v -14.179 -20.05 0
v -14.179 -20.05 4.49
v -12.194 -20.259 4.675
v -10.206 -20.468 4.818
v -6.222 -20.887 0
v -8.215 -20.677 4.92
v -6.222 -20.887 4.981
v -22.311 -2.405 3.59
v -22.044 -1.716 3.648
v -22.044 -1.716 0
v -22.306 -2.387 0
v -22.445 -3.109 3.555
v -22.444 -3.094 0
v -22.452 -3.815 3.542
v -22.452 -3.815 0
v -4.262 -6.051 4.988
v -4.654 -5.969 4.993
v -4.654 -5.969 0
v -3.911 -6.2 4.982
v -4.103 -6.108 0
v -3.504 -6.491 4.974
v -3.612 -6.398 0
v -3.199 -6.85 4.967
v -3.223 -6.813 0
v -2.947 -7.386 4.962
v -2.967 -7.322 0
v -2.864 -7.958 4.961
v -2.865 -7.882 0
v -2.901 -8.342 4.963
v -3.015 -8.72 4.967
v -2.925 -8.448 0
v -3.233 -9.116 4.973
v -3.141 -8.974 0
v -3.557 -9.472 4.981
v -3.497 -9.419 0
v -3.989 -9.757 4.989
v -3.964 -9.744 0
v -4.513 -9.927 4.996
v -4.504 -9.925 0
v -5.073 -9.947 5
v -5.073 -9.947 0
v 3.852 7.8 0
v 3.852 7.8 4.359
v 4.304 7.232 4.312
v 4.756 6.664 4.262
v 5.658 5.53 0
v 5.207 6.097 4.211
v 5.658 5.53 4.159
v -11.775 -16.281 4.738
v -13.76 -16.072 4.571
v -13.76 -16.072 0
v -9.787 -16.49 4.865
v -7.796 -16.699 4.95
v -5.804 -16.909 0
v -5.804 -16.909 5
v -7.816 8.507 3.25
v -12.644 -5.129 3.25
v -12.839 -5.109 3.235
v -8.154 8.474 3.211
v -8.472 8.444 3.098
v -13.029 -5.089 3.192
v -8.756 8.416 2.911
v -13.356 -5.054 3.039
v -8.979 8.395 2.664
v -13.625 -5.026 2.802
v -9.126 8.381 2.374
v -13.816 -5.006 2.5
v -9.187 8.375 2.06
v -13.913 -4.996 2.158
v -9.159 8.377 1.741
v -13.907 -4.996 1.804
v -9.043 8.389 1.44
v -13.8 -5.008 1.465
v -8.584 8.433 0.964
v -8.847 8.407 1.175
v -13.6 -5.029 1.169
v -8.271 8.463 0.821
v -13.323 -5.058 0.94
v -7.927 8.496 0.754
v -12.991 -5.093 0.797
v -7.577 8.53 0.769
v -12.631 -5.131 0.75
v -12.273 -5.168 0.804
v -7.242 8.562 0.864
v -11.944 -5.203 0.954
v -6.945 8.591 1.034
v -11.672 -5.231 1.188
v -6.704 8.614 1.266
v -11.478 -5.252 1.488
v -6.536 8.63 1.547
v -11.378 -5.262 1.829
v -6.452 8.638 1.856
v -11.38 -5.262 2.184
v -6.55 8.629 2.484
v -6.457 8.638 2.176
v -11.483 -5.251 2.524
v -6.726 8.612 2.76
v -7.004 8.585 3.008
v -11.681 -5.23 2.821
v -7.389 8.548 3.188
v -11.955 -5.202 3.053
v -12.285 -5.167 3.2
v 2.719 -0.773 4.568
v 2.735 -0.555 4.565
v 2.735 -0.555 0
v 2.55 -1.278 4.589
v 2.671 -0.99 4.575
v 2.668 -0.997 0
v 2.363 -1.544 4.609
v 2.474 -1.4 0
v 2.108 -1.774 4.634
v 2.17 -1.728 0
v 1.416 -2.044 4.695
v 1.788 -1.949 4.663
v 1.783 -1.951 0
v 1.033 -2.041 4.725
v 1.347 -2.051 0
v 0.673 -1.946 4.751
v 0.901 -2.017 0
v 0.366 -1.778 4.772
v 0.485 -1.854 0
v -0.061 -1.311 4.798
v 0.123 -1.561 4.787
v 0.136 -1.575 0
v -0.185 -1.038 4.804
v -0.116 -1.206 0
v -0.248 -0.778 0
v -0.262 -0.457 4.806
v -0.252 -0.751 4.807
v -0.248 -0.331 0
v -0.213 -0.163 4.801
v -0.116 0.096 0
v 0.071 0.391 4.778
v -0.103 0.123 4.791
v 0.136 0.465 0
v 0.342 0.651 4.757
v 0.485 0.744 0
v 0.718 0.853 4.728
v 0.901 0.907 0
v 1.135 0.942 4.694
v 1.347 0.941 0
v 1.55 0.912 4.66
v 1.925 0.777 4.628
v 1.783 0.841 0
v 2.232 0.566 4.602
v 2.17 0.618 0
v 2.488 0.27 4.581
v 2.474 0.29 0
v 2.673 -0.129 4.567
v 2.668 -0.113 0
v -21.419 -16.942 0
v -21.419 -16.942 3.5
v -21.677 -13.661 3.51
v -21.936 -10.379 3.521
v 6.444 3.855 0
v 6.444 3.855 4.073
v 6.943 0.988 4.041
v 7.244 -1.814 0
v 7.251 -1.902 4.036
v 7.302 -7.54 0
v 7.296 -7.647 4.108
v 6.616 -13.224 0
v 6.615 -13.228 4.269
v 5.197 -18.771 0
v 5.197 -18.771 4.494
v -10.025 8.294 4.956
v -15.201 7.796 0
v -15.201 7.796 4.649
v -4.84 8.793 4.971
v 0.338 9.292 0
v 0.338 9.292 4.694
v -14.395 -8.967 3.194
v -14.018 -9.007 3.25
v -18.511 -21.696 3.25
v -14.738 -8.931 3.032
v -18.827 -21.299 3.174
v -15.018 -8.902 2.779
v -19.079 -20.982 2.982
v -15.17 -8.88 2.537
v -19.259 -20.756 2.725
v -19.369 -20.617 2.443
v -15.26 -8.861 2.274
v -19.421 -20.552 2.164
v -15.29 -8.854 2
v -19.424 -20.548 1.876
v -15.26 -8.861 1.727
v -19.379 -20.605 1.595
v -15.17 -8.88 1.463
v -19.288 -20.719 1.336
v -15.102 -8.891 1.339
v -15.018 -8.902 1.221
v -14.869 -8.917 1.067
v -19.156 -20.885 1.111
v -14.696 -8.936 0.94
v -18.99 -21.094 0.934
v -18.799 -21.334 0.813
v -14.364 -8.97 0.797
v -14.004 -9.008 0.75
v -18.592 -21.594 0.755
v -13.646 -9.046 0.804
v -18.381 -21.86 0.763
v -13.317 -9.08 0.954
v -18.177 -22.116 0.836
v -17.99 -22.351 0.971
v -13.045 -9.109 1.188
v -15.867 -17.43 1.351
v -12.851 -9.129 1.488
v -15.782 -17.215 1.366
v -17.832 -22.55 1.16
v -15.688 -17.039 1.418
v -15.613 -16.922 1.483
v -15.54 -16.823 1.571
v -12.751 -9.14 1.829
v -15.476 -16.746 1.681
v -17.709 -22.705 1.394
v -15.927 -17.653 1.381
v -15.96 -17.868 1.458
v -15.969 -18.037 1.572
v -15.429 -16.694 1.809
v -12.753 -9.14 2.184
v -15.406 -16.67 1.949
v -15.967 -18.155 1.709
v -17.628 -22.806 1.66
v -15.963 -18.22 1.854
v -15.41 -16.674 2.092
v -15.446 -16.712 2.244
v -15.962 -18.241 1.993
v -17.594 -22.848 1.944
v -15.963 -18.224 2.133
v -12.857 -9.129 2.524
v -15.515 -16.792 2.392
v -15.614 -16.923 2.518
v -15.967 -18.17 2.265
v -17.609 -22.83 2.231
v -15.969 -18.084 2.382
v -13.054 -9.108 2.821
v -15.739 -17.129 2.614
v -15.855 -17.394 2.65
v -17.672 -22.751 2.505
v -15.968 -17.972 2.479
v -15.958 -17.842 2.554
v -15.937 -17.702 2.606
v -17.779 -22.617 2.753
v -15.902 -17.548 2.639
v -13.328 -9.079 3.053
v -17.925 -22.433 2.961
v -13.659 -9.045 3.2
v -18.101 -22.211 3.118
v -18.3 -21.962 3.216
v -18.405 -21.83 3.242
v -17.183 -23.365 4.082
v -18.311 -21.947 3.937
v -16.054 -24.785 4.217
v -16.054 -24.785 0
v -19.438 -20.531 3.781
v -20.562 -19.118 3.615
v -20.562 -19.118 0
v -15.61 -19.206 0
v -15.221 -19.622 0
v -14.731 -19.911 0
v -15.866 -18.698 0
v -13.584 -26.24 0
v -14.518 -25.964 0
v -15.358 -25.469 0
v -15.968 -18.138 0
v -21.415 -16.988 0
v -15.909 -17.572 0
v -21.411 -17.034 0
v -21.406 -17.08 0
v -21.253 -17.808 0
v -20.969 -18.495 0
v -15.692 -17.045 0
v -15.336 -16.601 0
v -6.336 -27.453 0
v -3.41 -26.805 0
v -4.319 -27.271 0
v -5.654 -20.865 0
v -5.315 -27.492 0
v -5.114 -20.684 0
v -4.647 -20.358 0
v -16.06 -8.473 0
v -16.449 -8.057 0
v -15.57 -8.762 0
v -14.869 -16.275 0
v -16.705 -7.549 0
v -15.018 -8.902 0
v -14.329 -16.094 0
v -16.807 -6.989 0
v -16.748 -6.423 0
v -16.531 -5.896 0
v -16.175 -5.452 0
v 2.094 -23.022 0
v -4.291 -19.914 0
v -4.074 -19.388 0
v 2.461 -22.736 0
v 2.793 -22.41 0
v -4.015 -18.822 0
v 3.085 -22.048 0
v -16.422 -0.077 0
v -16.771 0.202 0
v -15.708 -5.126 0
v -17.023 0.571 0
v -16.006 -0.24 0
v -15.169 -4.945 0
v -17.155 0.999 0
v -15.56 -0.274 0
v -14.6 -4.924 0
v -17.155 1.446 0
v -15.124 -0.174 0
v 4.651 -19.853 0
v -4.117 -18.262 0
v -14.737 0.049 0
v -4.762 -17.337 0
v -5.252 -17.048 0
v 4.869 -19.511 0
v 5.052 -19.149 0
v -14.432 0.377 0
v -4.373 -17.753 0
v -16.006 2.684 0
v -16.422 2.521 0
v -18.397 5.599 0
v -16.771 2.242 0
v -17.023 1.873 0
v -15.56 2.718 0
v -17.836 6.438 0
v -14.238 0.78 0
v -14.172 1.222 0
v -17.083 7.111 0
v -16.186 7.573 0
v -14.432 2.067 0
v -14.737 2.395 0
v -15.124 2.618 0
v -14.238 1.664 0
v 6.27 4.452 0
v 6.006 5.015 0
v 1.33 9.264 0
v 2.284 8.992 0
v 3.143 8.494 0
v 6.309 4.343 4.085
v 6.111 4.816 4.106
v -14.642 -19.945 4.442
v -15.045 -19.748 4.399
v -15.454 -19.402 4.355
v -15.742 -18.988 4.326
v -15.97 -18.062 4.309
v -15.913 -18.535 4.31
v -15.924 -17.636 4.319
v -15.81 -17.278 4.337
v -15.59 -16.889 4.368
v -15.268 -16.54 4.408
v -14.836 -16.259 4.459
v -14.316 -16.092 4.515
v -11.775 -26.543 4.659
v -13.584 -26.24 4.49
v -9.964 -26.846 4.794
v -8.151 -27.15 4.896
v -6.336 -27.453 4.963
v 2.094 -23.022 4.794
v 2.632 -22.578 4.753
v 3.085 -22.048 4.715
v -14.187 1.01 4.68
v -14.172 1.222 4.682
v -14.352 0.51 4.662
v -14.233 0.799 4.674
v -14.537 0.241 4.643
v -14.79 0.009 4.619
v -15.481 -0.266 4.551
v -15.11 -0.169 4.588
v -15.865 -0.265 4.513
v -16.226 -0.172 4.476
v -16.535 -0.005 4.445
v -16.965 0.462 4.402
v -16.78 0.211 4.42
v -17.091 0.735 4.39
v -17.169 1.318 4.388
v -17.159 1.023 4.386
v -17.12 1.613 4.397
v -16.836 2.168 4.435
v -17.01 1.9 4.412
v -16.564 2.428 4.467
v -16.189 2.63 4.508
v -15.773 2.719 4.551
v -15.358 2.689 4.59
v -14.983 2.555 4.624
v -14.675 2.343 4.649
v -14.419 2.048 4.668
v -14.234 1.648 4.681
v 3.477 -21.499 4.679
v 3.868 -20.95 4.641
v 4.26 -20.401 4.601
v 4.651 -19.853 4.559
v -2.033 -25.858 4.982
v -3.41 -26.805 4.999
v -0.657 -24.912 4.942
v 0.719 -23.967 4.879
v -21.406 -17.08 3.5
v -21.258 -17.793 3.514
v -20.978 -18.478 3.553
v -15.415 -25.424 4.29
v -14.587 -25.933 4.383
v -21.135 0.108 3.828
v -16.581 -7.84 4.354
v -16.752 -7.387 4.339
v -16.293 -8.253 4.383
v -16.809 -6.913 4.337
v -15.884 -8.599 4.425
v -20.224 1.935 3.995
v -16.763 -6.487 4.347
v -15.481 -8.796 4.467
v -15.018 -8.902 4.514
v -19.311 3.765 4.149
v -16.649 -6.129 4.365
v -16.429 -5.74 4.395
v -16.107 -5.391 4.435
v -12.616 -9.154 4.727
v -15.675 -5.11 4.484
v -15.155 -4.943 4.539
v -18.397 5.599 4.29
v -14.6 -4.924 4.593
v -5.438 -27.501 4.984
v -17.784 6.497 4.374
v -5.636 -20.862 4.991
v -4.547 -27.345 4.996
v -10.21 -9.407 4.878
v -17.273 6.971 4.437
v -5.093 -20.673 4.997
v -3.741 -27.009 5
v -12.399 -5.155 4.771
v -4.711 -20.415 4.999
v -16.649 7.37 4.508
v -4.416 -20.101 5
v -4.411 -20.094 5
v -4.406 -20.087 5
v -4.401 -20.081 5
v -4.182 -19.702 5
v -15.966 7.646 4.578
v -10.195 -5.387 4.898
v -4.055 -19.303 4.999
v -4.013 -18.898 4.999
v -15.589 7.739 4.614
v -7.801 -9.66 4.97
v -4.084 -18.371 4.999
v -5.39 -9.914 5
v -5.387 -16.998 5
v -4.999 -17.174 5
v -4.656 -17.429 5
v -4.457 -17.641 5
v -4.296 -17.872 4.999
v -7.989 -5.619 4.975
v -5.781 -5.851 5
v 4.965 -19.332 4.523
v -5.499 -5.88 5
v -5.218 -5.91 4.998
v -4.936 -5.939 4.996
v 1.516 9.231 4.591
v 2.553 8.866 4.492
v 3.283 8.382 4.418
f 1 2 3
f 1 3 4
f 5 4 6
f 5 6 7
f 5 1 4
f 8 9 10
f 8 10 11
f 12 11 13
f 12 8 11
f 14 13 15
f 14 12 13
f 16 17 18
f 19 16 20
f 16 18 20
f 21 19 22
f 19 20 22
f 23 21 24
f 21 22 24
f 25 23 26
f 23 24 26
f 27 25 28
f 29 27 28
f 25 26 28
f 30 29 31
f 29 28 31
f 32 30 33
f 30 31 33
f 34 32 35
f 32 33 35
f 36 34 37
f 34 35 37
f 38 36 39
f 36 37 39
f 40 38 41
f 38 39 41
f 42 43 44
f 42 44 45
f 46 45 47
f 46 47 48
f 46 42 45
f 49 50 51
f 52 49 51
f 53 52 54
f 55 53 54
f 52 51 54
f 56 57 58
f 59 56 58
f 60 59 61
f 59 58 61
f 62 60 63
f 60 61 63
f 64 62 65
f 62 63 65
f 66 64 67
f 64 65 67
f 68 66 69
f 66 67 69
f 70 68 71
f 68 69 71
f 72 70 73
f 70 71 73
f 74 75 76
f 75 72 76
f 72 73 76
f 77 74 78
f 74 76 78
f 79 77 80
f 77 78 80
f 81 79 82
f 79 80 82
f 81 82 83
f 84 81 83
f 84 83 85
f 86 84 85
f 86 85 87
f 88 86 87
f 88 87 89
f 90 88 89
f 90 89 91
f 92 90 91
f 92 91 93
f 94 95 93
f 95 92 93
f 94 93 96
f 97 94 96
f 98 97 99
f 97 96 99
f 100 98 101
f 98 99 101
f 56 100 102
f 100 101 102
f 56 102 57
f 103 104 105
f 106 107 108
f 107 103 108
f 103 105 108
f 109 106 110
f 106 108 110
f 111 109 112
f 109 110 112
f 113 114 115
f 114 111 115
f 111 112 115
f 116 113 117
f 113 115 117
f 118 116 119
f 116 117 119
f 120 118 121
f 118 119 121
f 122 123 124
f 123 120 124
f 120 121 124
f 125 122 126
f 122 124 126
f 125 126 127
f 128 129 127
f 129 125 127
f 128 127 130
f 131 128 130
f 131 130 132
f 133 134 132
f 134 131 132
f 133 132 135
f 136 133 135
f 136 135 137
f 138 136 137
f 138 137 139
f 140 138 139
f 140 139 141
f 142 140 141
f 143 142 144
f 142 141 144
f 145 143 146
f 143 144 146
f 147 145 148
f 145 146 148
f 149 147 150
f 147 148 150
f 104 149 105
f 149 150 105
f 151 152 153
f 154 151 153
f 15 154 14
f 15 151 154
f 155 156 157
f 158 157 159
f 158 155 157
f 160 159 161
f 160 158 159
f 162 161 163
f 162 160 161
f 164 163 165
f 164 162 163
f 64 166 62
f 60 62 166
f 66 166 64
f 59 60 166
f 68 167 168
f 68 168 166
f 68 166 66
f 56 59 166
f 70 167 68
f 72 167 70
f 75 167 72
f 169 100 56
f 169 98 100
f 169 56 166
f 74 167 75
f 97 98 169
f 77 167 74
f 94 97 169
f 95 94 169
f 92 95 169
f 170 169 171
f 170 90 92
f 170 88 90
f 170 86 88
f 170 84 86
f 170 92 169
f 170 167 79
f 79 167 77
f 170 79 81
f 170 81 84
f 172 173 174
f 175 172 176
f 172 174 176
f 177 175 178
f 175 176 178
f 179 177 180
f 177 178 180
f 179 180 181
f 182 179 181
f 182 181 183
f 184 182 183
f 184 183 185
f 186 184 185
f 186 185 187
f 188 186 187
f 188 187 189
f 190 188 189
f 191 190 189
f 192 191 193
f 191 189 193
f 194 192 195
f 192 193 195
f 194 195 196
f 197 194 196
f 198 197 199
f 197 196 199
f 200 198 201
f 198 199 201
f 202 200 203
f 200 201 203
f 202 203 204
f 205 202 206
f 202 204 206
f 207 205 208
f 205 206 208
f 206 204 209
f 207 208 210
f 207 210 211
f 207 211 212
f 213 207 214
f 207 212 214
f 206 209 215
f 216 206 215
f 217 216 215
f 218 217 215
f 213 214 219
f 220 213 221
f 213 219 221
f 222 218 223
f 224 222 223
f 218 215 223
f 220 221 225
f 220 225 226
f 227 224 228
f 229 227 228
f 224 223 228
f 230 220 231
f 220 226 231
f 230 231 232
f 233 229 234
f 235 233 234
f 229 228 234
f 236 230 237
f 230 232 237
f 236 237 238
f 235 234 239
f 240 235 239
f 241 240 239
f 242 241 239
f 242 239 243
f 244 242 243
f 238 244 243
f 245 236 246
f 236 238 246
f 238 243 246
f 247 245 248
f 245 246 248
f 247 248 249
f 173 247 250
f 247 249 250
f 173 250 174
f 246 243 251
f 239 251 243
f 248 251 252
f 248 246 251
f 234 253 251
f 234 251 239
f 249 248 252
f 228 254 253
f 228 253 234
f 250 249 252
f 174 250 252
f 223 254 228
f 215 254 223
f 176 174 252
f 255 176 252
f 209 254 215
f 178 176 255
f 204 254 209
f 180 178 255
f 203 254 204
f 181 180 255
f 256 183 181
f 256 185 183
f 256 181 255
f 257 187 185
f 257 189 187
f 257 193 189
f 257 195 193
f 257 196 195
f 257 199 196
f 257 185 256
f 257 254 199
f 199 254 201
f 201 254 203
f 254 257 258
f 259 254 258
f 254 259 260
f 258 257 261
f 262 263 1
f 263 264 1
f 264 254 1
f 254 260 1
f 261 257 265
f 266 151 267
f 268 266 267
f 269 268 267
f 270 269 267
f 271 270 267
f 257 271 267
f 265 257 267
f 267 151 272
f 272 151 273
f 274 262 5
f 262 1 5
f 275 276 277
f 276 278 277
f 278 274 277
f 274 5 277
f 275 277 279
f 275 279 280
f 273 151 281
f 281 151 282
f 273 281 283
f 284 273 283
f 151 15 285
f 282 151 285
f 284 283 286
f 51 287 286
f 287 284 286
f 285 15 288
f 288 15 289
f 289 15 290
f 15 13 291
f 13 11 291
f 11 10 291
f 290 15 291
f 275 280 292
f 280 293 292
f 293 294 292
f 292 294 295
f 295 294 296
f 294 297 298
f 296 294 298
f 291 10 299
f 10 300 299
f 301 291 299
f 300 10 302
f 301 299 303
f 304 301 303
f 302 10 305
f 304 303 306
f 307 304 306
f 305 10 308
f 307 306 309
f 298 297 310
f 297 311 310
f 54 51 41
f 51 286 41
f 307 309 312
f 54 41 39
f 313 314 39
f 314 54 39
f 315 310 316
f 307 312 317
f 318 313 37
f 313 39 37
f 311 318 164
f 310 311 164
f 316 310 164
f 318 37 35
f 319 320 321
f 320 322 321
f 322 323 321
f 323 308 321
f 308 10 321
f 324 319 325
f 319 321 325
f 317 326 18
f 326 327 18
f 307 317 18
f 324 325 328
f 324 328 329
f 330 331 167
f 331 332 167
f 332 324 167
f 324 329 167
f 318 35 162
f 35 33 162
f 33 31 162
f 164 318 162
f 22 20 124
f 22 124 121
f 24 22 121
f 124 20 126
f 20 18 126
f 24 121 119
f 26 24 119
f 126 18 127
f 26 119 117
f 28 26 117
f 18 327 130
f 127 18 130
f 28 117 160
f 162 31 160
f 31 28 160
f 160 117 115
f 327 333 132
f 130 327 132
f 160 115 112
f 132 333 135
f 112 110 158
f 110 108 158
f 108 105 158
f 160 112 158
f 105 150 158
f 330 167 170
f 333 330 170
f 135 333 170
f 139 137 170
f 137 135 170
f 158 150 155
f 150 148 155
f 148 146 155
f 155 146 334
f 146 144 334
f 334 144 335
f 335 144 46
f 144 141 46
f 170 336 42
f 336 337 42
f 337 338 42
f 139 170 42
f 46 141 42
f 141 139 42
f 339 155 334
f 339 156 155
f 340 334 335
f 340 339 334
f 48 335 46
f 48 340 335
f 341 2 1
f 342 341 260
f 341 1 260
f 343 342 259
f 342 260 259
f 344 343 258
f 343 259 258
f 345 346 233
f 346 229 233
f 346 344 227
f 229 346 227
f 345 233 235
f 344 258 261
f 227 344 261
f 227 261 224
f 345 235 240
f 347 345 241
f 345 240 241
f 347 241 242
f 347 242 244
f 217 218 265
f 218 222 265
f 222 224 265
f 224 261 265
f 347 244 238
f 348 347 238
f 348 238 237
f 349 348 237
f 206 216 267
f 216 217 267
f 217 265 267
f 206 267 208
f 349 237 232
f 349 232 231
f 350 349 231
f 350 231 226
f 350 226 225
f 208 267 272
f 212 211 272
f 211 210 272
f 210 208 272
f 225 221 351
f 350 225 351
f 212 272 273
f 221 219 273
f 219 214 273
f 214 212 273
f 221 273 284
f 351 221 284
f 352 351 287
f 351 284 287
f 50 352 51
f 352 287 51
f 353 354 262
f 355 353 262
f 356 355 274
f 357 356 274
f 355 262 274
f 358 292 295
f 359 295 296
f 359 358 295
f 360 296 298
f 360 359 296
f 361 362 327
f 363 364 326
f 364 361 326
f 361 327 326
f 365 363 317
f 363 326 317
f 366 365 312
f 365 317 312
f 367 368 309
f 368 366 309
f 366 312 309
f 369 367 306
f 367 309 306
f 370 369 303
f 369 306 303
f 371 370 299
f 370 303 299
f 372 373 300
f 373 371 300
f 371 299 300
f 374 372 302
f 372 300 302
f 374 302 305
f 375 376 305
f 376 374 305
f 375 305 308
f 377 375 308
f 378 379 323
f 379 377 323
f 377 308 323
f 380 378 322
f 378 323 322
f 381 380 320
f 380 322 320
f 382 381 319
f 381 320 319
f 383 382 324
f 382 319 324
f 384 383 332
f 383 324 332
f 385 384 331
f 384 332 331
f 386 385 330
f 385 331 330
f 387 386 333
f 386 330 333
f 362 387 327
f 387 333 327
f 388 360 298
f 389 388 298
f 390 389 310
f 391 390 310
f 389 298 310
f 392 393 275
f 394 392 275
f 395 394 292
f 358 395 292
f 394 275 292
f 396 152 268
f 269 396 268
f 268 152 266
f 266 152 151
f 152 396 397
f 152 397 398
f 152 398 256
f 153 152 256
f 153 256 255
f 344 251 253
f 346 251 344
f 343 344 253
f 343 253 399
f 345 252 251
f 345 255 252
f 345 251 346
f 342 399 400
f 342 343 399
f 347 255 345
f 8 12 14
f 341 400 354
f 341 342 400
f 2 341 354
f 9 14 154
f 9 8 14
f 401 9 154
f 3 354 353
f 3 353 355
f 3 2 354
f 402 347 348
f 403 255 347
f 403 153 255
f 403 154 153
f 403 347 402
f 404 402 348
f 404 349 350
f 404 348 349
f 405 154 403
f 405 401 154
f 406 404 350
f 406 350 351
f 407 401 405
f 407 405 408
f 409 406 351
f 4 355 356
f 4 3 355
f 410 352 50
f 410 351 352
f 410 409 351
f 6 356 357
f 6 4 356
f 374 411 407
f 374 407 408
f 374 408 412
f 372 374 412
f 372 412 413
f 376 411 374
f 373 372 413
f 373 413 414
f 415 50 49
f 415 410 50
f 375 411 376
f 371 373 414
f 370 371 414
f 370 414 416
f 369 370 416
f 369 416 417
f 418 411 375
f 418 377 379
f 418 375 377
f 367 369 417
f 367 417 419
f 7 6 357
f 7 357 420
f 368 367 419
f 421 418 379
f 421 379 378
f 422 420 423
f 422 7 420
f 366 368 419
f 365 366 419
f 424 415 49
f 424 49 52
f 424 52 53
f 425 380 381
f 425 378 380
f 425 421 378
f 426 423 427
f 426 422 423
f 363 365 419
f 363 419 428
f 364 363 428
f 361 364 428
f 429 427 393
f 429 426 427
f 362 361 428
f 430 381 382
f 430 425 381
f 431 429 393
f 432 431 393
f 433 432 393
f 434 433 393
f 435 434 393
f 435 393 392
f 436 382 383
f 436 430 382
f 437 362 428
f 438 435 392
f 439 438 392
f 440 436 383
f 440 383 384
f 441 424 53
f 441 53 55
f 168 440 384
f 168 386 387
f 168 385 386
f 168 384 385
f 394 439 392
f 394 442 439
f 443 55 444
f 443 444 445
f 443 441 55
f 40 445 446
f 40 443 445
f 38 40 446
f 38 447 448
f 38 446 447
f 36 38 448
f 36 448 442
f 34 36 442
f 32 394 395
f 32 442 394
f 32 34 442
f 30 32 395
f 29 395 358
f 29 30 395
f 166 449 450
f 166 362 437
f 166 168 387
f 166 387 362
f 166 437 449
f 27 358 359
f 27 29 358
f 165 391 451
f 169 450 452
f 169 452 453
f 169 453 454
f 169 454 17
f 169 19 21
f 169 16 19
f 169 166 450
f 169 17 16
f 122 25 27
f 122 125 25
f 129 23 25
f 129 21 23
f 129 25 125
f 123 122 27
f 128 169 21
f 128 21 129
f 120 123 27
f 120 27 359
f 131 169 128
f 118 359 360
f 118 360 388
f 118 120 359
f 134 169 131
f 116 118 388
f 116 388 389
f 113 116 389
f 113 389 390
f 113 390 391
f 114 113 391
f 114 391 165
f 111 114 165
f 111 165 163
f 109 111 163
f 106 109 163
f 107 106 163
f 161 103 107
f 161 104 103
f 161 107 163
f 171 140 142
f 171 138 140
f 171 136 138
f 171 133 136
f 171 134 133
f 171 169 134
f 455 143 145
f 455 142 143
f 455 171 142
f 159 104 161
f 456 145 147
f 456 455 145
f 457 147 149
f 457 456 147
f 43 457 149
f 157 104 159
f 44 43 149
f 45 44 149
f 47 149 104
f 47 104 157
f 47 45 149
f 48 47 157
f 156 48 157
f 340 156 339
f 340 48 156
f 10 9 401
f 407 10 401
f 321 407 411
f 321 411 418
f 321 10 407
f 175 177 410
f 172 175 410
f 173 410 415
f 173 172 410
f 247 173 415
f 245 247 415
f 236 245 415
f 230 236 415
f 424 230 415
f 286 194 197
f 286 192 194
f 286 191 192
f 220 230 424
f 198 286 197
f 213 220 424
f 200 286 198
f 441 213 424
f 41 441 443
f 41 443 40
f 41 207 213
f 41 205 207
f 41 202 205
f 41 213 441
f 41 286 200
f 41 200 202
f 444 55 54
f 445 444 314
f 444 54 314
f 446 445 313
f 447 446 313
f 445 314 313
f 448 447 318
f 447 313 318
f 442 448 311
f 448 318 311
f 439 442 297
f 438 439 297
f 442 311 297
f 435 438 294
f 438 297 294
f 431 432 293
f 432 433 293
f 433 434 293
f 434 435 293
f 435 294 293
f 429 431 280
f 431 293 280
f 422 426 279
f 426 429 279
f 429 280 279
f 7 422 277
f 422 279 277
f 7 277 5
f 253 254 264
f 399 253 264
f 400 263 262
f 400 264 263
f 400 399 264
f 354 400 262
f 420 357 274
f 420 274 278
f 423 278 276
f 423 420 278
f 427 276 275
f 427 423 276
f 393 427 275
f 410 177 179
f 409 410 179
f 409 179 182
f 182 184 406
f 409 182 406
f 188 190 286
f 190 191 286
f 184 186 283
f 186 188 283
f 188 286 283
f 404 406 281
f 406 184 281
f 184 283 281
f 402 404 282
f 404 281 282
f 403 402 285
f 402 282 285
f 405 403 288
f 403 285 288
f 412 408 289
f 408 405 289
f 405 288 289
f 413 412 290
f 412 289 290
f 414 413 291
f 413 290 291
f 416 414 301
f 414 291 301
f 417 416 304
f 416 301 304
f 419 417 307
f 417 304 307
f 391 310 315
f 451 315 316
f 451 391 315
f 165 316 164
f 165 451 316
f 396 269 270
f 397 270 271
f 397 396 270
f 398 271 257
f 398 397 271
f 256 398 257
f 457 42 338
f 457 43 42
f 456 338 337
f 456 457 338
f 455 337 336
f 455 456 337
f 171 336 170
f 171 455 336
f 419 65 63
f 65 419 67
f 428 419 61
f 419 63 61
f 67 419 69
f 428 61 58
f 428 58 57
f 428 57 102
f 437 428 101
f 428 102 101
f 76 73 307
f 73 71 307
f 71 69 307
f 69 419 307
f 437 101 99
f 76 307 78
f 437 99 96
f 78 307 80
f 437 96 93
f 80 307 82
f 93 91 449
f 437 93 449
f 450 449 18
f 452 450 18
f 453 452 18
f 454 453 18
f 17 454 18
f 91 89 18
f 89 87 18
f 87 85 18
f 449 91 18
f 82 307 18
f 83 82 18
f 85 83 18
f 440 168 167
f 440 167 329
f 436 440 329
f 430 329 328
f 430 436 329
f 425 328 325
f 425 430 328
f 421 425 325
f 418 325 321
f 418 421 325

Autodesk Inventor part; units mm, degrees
ref_plane "YZ Plane" through (0, 0, 0) normal (1, 0, 0) x (0, 1, 0)
ref_plane "XZ Plane" through (0, 0, 0) normal (0, 1, 0) x (-1, 0, 0)
sketch "Base" plane through (0, 0, 0) normal (0, 0, 1) x (1, 0, 0)
  circle A0 centre (-15.6718, 1.2221) radius 1.5
  circle A1 centre (-13.9696, -18.0615) radius 2
  line L0 (-13.9696, -18.0615) -> (-6.0134, -18.8977) construction
  circle A2 centre (-6.0134, -18.8977) radius 2
  circle A3 centre (-14.8088, -6.9127) radius 2
  circle A4 centre (-4.8636, -7.958) radius 2
  line L1 (-14.8088, -6.9127) -> (-4.8636, -7.958) construction
  line L2 (-14.1786, -20.0505) -> (-6.2224, -20.8868)
  line L3 (-13.7605, -16.0724) -> (-5.8043, -16.9087)
  line L4 (-15.0178, -8.9017) -> (-5.0726, -9.947)
  line L5 (-14.5997, -4.9237) -> (-4.6545, -5.9689)
  line L6 (-6.0134, -18.8977) -> (-4.8636, -7.958) construction
  circle A5 centre (1.2351, -0.5549) radius 1.5
  line L7 (-15.6718, 1.2221) -> (1.2351, -0.5549) construction
  line L8 (-21.3231, -18.1609) -> (-22.5392, -2.7087)
  line L9 (-15.0979, -25.987) -> (-21.3231, -18.1609)
  line L10 (-22.5392, -2.7087) -> (-17.4079, 7.5831)
  line L11 (-17.4079, 7.5831) -> (2.5, 9.5)
  line L12 (-4.7419, -27.72) -> (2.6752, -22.6223)
  line L13 (-15.0979, -25.987) -> (-4.7419, -27.72)
  arc A6 (4.998, -19.3658) -> (6.2351, 4.8044) centre (-36.6314, -5.1184) ccw
  line L14 (2.6752, -22.6223) -> (4.998, -19.3658)
  line L15 (2.5, 9.5) -> (6.2351, 4.8044)
  line L16 (-45.5436, 0) -> (16.8418, 0) construction
  line L17 (0, -35.164) -> (0, 16.944) construction
  dimension "d119" = 8
  dimension "d129" = 10
  dimension "d290" = 11
  dimension "d293" = 3
  dimension "d294" = 122
  dimension "d295" = 123
  dimension "d296" = 149
  dimension "d297" = 146
  dimension "d298" = 138
  dimension "d299" = 136
  dimension "d300" = 160
  dimension "d301" = 44
  dimension "d302" = 94.5
  dimension "d303" = 11.5
  dimension "d304" = 20
  dimension "d305" = 15.5
  dimension "d306" = 10
  dimension "d307" = 10.5
  dimension "d308" = 9
  dimension "d309" = 4
  dimension "d310" = 6
  dimension "d311" = 6
  dimension "d312" = 8
  dimension "d313" = 17
  dimension "d314" = 2.5
  dimension "d315" = 9.5
  dimension "d316" = 11
  dimension "d317" = 8
  dimension "d318" = 5
  dimension "d319" = 4
extrude "BaseFeature" add sketch "Base" along normal blind 5
fillet "BaseFilletsFeature" radius 4 9 edges at (6.2351, 4.8044, 2.5) (2.5, 9.5, 2.5) (4.998, -19.3658, 2.5) (2.6752, -22.6223, 2.5) (-4.7419, -27.72, 2.5) (-15.0979, -25.987, 2.5) (-21.3231, -18.1609, 2.5) (-22.5392, -2.7087, 2.5) (-17.4079, 7.5831, 2.5)
sketch "SideProfile" plane through (-15.2009, 7.7956, 5) normal (-0.0958, 0.9954, 0) x (0.9954, 0.0958, 0)
  arc A0 (-8.5605, 1.5) -> (21.6674, 1) centre (8.0701, 92.9423) ccw
  line L0 (21.6674, 1) -> (21.6674, 5)
  line L1 (21.6674, 5) -> (-8.5605, 5)
  line L2 (-8.5605, 1.5) -> (-8.5605, 5)
  line L3 (15.6109, 5) -> (0, 5) projected
  line L4 (15.6109, 0) -> (0, 0) construction
  line L5 (-8.5605, 0) -> (-8.5605, 5) projected
  line L6 (21.1674, 0) -> (21.1674, 5) projected
  dimension "d328" = 4
  dimension "d329" = 3.5
  dimension "d330" = 0.5
extrude "SideProfileFeature" cut sketch "SideProfile" against normal through all keep common part
sketch "ChannelAngle" plane through (0, 0, 0) normal (0, 0, -1) x (-1, 0, 0)
  line L0 (18.2542, -22.019) -> (7.4314, 8.5437) construction
  line L1 (20.5618, -19.1179) -> (16.0538, -24.7853) construction
  line L2 (-0.3382, 9.2918) -> (15.2009, 7.7956) construction
  line L3 (22.4522, -3.8145) -> (21.419, -16.9417) projected
  dimension "d331" = 156
ref_plane "ChannelAngleOrthoPlane" through (0.3382, 9.2918, 0) normal (-0.3338, -0.9426, 0) x (0, 0, 1)
ref_plane "ChannelAngleBasePlane" through (-18.2542, -22.019, 0) normal (-0.9426, 0.3338, 0) x (0.3338, 0.9426, 0)
sketch "Channel" plane through (0.3382, 9.2918, 0) normal (-0.3338, -0.9426, 0) x (0, 0, 1)
  circle A0 centre (2, 7.4241) radius 1.25
  line L0 (0, 0) -> (0, 14.1483) construction
  line L1 (3.6483, 17.4241) -> (0, 17.4241) projected
  dimension "d334" = 2.5
  dimension "d335" = 2
  dimension "d336" = 10
hole "ChannelHoleFeature" at (-6.6601, 11.7701, 2) direction (-0.3338, -0.9426, 0) diameter 2.5 end through all
properties part number "ThumbRouter"
